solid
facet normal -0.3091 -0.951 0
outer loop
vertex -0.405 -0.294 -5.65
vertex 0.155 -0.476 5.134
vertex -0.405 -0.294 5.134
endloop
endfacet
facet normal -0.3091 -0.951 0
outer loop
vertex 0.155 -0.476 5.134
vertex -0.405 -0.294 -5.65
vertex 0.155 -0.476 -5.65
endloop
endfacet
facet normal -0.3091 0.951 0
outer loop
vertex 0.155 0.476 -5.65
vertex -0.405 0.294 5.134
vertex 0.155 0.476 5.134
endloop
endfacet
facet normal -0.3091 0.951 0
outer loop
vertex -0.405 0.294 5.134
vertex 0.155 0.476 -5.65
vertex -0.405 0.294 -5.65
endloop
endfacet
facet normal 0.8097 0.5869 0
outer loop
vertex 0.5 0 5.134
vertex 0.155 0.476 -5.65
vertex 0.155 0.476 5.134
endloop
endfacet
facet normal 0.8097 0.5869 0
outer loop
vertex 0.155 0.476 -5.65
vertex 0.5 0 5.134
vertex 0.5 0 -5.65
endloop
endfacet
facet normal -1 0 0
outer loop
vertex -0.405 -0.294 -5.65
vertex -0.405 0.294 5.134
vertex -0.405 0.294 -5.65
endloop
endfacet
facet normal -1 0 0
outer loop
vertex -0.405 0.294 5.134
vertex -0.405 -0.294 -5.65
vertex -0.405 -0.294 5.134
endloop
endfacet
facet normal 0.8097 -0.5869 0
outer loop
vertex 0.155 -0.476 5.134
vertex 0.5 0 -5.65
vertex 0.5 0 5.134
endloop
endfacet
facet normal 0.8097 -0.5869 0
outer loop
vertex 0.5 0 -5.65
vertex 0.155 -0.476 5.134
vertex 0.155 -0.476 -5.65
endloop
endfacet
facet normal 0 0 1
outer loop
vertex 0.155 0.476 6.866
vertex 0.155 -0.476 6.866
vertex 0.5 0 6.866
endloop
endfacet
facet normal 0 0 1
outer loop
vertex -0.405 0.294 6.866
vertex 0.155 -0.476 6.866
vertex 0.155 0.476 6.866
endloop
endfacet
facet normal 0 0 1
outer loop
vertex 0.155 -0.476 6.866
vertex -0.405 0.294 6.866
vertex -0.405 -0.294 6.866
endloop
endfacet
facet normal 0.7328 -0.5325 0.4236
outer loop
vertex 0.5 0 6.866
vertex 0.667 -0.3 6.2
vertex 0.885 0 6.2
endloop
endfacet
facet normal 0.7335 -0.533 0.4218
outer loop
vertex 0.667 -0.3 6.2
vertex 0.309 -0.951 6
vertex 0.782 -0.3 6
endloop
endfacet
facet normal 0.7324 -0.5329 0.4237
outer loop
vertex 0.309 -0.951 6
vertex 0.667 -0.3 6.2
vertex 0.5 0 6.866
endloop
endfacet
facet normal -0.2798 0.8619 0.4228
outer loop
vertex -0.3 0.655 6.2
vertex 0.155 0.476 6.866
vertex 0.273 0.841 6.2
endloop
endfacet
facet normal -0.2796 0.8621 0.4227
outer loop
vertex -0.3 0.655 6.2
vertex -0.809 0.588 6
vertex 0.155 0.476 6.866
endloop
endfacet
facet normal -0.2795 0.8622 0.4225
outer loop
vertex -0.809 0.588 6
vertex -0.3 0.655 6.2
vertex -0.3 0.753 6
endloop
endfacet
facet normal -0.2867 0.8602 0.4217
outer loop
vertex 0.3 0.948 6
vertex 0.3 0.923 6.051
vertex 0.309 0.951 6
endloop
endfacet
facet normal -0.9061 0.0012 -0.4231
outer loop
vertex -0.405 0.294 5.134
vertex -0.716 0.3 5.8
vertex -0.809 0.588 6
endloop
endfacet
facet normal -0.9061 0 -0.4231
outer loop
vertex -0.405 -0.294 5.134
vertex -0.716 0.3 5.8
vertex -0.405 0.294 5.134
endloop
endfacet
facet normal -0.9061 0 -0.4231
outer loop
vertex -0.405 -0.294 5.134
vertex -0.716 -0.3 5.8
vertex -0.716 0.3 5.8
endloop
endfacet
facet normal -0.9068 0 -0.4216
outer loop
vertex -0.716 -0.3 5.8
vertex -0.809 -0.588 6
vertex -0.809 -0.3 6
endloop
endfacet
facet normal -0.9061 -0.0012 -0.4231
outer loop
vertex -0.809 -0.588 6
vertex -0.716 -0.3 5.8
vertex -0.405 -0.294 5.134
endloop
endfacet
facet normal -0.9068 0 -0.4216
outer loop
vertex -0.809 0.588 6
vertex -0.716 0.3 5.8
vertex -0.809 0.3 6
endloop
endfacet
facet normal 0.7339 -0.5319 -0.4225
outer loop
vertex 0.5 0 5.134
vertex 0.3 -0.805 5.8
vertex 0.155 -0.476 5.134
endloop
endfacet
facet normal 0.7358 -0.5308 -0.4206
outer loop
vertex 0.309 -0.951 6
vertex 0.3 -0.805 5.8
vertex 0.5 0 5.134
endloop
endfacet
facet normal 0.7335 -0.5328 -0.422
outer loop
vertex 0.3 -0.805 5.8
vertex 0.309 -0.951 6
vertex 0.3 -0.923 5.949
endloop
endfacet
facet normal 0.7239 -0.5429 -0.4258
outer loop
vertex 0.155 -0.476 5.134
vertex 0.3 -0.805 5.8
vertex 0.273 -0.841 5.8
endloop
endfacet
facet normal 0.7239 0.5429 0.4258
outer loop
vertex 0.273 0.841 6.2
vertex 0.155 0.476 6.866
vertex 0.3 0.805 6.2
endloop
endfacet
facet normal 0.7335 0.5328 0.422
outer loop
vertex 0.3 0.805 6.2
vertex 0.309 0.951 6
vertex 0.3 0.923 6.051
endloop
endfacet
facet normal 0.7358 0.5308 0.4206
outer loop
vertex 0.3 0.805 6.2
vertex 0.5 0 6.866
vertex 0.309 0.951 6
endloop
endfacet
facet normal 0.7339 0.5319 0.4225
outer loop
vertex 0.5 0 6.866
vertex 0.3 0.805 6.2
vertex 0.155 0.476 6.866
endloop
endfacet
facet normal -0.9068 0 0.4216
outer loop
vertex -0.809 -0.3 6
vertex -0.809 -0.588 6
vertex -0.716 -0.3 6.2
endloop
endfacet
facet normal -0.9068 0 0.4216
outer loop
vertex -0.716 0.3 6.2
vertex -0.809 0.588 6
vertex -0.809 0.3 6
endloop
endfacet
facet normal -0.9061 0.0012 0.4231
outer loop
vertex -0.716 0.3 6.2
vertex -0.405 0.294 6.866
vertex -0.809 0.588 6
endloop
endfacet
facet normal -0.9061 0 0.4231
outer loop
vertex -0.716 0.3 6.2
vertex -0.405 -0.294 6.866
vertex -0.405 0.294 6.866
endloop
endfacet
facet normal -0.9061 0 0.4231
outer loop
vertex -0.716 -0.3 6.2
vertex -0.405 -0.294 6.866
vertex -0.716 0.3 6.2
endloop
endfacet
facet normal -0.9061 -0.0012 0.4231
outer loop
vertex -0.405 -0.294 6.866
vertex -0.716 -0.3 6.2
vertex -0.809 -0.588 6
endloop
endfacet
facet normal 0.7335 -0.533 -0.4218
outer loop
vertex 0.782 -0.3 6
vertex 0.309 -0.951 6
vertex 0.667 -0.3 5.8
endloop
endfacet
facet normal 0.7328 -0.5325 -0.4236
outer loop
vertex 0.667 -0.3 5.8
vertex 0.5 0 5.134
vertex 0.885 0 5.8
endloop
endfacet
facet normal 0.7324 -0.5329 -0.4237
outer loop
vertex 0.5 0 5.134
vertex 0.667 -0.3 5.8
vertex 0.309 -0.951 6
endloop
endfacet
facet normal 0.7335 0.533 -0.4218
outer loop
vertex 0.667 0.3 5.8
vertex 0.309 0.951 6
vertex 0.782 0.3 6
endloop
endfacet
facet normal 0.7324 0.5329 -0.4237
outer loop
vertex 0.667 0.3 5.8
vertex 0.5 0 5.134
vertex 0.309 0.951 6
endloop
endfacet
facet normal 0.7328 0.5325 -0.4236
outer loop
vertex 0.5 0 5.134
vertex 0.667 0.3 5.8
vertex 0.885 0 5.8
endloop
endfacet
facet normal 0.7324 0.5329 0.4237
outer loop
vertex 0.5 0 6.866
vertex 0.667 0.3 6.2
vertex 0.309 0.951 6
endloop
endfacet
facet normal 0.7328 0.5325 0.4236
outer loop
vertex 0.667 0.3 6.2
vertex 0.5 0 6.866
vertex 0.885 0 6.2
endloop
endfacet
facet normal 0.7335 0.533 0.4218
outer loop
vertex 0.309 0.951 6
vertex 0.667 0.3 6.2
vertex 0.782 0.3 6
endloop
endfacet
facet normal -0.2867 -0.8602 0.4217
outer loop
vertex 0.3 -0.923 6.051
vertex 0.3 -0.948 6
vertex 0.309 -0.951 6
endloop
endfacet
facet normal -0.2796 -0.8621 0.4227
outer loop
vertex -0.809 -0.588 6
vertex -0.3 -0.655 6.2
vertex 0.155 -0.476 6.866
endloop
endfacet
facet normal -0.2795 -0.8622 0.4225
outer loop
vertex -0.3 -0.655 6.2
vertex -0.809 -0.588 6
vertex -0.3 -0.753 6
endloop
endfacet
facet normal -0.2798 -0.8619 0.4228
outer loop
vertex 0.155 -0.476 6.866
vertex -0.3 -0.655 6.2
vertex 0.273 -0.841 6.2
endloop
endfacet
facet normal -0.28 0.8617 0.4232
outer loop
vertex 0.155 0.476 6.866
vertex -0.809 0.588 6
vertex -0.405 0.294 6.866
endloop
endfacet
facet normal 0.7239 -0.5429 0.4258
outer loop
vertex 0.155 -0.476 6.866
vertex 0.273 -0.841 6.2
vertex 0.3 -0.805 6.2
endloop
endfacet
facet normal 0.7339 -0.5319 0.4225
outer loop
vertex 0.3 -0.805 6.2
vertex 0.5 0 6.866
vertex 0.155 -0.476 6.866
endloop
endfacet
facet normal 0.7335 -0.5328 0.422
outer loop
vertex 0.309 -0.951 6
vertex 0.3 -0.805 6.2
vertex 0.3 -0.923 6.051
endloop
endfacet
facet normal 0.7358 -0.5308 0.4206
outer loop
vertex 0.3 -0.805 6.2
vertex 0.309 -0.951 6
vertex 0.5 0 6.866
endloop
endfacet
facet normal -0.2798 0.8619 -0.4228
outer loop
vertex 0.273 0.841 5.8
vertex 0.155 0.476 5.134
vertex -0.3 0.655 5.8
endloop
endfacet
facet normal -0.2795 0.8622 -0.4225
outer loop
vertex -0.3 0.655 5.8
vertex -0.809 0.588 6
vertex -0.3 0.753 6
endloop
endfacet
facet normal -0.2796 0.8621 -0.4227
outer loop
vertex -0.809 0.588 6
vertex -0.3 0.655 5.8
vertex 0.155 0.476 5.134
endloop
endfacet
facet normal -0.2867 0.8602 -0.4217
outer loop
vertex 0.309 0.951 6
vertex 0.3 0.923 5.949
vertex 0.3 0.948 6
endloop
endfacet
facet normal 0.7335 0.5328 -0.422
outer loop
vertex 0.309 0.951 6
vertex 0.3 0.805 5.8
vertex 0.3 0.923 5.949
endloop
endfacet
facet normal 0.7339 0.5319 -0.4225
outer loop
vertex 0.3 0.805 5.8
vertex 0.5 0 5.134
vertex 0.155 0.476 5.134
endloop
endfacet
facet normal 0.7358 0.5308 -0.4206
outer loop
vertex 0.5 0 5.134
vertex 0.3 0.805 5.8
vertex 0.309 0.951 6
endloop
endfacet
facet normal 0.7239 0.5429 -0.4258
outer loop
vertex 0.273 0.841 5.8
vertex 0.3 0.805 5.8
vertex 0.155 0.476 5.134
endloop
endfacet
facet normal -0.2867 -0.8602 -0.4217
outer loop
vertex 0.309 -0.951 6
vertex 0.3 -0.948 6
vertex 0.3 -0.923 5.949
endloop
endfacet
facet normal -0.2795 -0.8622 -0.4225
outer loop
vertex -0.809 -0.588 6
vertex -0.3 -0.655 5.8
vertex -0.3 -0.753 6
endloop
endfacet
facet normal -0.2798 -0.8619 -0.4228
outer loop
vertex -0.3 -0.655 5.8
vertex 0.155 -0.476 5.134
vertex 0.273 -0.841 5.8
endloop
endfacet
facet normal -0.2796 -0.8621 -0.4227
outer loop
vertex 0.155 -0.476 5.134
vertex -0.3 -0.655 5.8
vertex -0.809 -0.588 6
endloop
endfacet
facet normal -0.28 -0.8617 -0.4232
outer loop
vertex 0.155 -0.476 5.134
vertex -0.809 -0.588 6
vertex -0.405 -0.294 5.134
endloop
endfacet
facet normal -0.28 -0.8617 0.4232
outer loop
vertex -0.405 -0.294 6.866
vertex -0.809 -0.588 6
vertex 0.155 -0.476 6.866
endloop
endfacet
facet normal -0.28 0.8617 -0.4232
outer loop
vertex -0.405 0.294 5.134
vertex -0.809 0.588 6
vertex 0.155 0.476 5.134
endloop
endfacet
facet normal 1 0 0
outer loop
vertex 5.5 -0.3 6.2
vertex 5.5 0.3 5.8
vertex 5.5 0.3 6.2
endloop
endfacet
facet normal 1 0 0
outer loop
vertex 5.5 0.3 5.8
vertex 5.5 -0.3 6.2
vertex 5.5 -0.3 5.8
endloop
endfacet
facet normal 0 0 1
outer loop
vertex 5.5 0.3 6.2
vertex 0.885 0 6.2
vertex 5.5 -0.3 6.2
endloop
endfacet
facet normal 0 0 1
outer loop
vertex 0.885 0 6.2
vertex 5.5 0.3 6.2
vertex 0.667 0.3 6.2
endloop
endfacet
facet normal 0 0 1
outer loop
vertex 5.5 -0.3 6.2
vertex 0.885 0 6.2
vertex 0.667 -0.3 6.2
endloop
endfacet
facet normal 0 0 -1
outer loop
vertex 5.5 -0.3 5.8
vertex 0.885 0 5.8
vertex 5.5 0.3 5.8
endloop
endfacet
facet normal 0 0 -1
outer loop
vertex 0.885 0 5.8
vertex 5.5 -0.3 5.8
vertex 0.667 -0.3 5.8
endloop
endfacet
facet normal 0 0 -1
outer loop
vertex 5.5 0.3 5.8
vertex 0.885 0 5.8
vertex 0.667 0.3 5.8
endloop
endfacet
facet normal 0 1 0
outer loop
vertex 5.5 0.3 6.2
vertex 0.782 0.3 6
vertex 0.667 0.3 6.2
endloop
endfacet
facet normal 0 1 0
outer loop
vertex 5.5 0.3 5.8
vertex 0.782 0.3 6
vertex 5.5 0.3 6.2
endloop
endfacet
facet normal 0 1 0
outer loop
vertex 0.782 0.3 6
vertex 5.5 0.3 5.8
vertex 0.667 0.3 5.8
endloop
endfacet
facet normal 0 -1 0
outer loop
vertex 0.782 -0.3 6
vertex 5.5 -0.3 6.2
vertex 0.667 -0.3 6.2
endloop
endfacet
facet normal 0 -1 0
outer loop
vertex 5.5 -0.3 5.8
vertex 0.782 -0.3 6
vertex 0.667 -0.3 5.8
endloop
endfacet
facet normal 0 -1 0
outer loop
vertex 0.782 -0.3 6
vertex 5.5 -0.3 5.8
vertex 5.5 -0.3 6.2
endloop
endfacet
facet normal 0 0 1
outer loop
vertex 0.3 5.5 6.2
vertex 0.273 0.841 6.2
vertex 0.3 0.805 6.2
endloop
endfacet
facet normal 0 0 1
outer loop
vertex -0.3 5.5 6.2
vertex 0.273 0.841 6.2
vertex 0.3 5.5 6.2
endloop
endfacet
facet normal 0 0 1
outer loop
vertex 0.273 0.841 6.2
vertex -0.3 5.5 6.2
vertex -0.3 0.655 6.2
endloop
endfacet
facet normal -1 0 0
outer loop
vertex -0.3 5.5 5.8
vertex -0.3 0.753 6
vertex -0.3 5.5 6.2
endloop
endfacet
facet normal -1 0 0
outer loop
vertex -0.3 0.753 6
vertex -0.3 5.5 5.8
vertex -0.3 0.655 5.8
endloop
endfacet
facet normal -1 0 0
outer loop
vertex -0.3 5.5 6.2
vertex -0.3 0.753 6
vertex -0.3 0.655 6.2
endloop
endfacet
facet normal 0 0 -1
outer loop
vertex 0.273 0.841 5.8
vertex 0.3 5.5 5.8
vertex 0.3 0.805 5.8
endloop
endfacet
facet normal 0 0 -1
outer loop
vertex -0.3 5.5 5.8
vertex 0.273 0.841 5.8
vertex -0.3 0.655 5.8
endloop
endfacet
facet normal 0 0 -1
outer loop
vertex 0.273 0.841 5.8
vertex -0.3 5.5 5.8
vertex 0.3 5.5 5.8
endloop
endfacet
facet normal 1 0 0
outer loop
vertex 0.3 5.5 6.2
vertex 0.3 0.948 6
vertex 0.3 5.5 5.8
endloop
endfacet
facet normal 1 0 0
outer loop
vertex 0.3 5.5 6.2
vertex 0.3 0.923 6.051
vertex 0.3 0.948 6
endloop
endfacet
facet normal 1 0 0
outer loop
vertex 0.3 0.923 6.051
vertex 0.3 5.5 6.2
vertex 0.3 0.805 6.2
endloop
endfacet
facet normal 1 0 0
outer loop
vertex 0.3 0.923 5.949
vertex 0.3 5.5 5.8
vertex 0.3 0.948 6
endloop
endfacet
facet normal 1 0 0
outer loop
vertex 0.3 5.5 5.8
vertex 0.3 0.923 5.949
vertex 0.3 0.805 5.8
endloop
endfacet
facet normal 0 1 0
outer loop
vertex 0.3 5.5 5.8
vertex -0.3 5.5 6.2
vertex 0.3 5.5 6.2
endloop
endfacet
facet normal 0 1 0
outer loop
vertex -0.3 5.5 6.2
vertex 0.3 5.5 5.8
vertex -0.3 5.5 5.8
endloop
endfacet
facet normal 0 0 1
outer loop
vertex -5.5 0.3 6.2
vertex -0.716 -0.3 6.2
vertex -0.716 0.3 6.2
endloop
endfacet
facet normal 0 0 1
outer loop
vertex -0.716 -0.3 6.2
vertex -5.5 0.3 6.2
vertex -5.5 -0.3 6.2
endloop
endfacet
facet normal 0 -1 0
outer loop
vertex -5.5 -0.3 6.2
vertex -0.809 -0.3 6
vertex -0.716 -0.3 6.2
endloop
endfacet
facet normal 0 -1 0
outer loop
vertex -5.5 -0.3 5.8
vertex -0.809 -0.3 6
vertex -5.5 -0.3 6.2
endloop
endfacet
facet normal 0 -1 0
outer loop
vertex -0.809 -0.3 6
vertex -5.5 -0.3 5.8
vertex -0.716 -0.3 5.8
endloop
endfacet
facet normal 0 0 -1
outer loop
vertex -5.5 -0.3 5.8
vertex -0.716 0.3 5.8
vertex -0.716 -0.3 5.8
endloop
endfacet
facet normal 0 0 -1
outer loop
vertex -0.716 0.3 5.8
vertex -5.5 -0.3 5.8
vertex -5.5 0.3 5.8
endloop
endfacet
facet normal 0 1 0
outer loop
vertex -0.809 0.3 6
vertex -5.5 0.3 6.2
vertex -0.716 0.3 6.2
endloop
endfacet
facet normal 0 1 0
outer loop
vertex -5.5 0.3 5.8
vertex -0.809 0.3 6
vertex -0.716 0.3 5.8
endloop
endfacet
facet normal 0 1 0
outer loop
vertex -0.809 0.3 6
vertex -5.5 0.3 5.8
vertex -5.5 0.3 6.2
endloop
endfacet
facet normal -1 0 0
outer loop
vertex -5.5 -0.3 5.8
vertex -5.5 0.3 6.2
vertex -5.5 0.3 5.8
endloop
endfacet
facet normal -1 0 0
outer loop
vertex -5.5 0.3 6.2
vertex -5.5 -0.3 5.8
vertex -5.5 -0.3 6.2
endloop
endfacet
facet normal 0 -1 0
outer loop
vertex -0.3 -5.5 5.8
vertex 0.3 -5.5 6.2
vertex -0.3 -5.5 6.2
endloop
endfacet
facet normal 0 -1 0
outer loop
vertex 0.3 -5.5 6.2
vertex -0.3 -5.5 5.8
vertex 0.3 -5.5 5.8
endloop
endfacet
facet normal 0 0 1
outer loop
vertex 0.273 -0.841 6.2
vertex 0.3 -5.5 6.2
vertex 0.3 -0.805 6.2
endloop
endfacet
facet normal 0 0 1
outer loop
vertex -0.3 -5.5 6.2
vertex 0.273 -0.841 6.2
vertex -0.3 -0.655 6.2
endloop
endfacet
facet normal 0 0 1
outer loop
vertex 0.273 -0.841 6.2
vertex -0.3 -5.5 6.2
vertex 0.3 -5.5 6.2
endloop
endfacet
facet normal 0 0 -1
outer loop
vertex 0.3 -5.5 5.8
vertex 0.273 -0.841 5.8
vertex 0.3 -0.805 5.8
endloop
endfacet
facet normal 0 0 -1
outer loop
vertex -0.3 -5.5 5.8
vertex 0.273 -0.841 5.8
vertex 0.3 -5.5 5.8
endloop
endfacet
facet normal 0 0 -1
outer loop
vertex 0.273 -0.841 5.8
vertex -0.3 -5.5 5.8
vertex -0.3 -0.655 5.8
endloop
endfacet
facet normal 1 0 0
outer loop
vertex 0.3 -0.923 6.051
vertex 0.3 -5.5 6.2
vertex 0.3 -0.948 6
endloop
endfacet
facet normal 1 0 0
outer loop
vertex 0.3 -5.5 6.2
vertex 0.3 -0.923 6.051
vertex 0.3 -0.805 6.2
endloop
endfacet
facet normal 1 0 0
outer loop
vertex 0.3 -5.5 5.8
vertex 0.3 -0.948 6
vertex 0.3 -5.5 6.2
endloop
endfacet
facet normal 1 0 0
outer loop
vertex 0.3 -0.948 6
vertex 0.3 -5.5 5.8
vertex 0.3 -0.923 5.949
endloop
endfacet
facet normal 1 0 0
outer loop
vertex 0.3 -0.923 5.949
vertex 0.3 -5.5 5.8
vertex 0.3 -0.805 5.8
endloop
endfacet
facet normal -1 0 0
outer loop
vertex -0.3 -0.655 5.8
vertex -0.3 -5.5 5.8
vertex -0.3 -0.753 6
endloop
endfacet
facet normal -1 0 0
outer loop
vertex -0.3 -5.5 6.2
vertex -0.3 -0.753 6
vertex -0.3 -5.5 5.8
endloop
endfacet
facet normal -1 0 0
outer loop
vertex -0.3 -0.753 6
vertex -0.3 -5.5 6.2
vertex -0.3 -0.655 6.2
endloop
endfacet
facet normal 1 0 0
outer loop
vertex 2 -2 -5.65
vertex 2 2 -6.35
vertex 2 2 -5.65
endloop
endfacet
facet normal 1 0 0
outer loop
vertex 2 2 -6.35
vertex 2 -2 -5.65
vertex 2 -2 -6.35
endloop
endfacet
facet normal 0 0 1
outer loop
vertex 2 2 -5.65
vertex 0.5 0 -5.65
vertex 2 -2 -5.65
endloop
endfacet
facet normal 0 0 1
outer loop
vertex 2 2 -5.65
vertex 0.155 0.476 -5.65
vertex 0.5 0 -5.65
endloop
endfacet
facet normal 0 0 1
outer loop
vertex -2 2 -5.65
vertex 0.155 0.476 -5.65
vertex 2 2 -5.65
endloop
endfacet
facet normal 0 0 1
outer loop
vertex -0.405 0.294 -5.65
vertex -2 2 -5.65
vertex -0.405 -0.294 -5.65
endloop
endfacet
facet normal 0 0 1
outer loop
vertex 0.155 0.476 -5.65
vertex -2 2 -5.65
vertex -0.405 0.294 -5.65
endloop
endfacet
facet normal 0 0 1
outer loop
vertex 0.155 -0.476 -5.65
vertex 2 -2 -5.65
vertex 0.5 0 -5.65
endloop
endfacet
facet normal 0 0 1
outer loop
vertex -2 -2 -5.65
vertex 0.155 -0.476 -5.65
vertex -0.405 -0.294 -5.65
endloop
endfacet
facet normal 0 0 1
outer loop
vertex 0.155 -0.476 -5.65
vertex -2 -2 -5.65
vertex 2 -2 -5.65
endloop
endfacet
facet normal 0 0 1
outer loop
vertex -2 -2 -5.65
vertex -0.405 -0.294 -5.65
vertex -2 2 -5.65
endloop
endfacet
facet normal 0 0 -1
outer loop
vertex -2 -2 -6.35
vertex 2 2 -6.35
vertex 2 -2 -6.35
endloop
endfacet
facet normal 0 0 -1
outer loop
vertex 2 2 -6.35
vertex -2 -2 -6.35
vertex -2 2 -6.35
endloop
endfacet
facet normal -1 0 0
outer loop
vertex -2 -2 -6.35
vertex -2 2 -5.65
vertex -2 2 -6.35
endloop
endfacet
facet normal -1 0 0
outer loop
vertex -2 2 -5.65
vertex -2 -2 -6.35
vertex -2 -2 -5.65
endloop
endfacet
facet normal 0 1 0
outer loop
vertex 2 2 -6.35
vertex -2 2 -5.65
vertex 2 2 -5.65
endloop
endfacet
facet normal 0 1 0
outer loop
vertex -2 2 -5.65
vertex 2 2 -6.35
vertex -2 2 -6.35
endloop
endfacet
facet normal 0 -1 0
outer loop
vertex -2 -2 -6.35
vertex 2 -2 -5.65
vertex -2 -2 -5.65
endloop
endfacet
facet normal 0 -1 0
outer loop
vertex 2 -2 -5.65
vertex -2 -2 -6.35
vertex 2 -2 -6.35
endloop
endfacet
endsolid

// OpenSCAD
module blade(angle=0) {
  rotate([0,0,angle])
    translate([3,0,0])
      cube([5,0.6,0.4], center=true);
}

module windmill_pump() {
  union() {
    cylinder(h=12, r=0.5, center=true);
    translate([0,0,6])
      sphere(r=1);
    translate([0,0,6])
      blade(0);
    translate([0,0,6])
      blade(90);
    translate([0,0,6])
      blade(180);
    translate([0,0,6])
      blade(270);
    translate([0,0,-6])
      cube([4,4,0.7], center=true);
  }
}

windmill_pump();
